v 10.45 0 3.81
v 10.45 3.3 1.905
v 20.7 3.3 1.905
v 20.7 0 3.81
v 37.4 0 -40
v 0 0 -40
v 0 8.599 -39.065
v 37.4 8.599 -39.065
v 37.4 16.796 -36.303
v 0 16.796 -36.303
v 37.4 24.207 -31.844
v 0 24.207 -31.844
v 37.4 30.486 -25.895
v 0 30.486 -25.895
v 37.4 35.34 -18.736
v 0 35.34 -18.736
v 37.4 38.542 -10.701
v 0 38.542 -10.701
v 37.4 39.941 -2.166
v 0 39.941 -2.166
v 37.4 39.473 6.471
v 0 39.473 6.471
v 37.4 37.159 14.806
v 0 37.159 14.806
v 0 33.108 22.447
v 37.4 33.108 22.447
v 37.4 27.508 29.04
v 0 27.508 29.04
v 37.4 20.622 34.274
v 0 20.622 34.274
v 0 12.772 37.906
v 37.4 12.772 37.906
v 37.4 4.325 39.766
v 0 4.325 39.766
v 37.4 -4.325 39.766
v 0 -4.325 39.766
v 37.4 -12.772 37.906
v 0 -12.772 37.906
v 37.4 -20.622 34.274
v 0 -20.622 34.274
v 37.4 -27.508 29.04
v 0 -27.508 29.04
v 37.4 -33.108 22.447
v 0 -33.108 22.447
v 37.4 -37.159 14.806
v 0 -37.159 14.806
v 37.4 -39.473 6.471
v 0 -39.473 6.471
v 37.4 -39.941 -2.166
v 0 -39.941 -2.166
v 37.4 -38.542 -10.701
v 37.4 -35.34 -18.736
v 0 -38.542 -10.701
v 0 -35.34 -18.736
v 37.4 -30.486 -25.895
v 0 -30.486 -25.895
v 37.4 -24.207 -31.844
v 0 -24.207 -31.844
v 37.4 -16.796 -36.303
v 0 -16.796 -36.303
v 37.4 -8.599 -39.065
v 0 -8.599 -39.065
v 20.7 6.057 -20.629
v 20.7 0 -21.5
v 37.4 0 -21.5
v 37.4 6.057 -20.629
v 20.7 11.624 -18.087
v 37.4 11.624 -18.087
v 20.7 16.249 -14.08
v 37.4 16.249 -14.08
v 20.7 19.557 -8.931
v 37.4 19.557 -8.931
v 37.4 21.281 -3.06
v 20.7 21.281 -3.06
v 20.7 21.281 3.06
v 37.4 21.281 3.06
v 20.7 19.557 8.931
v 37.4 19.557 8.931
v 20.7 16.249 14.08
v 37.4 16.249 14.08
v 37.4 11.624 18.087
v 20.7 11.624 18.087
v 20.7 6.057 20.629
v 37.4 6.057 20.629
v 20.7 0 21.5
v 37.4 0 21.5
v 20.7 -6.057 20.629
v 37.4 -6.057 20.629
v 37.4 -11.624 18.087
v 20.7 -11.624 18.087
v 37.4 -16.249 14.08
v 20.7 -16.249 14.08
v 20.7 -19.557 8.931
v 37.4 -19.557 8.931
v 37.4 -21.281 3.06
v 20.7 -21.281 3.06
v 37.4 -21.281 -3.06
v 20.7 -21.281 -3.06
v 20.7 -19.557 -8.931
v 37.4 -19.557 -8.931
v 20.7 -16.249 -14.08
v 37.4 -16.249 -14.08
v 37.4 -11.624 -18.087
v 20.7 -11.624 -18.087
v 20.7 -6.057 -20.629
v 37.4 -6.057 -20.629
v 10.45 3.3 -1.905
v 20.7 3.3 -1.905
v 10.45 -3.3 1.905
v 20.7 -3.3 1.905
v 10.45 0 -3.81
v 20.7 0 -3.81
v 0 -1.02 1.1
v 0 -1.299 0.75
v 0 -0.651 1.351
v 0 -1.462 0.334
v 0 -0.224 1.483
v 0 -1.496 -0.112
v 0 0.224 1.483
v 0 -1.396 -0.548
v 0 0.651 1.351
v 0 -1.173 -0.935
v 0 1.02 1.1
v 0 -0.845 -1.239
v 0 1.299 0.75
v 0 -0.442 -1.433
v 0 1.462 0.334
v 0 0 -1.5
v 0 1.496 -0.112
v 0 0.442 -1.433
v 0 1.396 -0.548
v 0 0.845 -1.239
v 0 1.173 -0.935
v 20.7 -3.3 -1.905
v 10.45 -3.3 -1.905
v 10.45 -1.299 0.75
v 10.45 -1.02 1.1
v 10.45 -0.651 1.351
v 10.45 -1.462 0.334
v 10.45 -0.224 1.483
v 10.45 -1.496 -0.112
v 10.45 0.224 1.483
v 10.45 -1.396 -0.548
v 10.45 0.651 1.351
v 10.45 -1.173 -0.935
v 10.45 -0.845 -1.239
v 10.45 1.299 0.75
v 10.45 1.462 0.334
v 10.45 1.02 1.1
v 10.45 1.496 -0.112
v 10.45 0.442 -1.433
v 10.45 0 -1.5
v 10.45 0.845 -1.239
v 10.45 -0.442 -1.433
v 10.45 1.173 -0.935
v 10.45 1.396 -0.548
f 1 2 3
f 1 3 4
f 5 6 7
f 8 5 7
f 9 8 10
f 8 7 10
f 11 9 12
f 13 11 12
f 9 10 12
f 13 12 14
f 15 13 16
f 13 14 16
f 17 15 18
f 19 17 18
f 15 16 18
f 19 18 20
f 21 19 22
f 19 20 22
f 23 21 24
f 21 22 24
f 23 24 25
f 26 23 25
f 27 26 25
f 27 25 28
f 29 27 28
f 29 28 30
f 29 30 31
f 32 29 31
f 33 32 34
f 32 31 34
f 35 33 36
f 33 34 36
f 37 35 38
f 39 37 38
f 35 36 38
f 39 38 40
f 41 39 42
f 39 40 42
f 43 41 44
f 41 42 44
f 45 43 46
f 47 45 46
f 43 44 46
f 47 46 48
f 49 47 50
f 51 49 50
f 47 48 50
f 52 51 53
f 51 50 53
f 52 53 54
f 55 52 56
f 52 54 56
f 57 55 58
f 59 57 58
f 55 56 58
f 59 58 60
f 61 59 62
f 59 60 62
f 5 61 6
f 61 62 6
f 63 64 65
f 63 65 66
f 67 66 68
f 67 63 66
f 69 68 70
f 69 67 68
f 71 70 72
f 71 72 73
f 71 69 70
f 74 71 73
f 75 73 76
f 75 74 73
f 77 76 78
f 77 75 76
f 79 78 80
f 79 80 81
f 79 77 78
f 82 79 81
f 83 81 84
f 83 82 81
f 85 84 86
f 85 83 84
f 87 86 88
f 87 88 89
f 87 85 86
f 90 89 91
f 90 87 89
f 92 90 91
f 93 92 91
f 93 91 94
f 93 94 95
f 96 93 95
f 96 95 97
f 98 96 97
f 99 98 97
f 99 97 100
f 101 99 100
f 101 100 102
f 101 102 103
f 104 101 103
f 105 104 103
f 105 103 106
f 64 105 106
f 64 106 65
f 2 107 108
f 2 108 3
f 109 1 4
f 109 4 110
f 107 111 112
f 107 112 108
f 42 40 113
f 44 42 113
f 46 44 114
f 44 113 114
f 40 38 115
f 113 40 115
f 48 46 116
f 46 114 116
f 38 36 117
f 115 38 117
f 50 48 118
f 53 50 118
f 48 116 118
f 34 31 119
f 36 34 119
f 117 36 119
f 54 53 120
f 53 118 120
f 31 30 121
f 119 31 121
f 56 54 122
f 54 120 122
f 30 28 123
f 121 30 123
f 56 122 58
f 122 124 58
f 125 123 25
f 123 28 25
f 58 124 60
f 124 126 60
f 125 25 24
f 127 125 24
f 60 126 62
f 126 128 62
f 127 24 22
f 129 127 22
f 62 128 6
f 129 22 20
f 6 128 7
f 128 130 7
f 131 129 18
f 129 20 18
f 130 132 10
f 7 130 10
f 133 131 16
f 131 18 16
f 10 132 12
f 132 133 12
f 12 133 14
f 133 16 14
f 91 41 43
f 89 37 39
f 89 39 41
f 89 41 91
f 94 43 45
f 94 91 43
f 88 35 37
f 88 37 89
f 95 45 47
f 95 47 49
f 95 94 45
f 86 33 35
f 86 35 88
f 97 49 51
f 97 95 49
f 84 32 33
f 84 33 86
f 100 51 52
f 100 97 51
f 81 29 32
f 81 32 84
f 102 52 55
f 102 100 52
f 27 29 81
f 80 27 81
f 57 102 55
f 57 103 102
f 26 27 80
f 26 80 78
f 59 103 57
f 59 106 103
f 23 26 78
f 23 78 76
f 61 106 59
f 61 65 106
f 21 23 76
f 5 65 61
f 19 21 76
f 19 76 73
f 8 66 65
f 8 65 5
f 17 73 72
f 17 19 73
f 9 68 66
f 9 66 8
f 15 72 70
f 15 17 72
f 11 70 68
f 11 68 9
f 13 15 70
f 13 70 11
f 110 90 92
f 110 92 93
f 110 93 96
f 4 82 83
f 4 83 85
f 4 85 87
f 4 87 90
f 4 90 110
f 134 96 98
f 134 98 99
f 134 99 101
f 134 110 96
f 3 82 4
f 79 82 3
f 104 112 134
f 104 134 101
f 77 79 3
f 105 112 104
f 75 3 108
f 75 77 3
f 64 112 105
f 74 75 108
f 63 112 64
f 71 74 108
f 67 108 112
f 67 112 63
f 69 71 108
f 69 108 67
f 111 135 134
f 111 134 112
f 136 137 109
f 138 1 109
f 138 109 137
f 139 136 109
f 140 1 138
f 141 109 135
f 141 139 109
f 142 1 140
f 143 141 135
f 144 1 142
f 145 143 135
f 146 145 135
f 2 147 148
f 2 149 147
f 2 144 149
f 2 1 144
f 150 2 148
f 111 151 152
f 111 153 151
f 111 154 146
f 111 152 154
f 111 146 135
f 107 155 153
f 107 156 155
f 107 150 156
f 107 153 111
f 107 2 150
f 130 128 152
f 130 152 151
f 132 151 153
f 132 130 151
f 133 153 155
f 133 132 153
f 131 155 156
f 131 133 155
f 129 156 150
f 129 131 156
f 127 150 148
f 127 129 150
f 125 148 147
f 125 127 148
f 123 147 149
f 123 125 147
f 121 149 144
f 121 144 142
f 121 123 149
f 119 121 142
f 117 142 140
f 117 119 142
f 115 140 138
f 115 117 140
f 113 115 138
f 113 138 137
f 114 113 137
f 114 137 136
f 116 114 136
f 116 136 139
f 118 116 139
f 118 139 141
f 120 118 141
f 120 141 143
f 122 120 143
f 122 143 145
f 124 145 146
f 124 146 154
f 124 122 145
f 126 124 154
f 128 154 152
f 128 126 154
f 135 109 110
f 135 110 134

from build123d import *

# Parameters (mm, degrees)
SKETCH1_R           = 40
SKETCH1_R_2         = 21.5
BOSS_EXTRUDE1_DEPTH = 37.4
SKETCH1_3_R         = 21.5
BOSS_EXTRUDE2_DEPTH = 20.7
SKETCH1_5_R         = 1.5
BOSS_EXTRUDE3_DEPTH = 10.45


with BuildPart() as part:
    # Sketch1 → Boss-Extrude1 (new body)
    with BuildSketch(Plane(origin=(0, 0, 0), x_dir=(0, 0, -1), z_dir=(1, 0, 0))):
        Circle(SKETCH1_R)
        Circle(SKETCH1_R_2, mode=Mode.SUBTRACT)
    extrude(amount=BOSS_EXTRUDE1_DEPTH)

    # Sketch1<3> → Boss-Extrude2 (add)
    with BuildSketch(Plane(origin=(0, 0, 0), x_dir=(0, 0, -1), z_dir=(1, 0, 0))):
        Circle(SKETCH1_3_R)
        Polygon((1.905, 3.299556788), (3.81, 0), (1.905, -3.299556788), (-1.905, -3.299556788), (-3.81, 0), (-1.905, 3.299556788), align=None, mode=Mode.SUBTRACT)
    extrude(amount=BOSS_EXTRUDE2_DEPTH)

    # Sketch1<5> → Boss-Extrude3 (add)
    with BuildSketch(Plane(origin=(0, 0, 0), x_dir=(0, 0, -1), z_dir=(1, 0, 0))):
        Polygon((1.905, -3.299556788), (3.81, 0), (1.905, 3.299556788), (-1.905, 3.299556788), (-3.81, 0), (-1.905, -3.299556788), align=None)
        Circle(SKETCH1_5_R, mode=Mode.SUBTRACT)
    extrude(amount=BOSS_EXTRUDE3_DEPTH)


solid = part.part
